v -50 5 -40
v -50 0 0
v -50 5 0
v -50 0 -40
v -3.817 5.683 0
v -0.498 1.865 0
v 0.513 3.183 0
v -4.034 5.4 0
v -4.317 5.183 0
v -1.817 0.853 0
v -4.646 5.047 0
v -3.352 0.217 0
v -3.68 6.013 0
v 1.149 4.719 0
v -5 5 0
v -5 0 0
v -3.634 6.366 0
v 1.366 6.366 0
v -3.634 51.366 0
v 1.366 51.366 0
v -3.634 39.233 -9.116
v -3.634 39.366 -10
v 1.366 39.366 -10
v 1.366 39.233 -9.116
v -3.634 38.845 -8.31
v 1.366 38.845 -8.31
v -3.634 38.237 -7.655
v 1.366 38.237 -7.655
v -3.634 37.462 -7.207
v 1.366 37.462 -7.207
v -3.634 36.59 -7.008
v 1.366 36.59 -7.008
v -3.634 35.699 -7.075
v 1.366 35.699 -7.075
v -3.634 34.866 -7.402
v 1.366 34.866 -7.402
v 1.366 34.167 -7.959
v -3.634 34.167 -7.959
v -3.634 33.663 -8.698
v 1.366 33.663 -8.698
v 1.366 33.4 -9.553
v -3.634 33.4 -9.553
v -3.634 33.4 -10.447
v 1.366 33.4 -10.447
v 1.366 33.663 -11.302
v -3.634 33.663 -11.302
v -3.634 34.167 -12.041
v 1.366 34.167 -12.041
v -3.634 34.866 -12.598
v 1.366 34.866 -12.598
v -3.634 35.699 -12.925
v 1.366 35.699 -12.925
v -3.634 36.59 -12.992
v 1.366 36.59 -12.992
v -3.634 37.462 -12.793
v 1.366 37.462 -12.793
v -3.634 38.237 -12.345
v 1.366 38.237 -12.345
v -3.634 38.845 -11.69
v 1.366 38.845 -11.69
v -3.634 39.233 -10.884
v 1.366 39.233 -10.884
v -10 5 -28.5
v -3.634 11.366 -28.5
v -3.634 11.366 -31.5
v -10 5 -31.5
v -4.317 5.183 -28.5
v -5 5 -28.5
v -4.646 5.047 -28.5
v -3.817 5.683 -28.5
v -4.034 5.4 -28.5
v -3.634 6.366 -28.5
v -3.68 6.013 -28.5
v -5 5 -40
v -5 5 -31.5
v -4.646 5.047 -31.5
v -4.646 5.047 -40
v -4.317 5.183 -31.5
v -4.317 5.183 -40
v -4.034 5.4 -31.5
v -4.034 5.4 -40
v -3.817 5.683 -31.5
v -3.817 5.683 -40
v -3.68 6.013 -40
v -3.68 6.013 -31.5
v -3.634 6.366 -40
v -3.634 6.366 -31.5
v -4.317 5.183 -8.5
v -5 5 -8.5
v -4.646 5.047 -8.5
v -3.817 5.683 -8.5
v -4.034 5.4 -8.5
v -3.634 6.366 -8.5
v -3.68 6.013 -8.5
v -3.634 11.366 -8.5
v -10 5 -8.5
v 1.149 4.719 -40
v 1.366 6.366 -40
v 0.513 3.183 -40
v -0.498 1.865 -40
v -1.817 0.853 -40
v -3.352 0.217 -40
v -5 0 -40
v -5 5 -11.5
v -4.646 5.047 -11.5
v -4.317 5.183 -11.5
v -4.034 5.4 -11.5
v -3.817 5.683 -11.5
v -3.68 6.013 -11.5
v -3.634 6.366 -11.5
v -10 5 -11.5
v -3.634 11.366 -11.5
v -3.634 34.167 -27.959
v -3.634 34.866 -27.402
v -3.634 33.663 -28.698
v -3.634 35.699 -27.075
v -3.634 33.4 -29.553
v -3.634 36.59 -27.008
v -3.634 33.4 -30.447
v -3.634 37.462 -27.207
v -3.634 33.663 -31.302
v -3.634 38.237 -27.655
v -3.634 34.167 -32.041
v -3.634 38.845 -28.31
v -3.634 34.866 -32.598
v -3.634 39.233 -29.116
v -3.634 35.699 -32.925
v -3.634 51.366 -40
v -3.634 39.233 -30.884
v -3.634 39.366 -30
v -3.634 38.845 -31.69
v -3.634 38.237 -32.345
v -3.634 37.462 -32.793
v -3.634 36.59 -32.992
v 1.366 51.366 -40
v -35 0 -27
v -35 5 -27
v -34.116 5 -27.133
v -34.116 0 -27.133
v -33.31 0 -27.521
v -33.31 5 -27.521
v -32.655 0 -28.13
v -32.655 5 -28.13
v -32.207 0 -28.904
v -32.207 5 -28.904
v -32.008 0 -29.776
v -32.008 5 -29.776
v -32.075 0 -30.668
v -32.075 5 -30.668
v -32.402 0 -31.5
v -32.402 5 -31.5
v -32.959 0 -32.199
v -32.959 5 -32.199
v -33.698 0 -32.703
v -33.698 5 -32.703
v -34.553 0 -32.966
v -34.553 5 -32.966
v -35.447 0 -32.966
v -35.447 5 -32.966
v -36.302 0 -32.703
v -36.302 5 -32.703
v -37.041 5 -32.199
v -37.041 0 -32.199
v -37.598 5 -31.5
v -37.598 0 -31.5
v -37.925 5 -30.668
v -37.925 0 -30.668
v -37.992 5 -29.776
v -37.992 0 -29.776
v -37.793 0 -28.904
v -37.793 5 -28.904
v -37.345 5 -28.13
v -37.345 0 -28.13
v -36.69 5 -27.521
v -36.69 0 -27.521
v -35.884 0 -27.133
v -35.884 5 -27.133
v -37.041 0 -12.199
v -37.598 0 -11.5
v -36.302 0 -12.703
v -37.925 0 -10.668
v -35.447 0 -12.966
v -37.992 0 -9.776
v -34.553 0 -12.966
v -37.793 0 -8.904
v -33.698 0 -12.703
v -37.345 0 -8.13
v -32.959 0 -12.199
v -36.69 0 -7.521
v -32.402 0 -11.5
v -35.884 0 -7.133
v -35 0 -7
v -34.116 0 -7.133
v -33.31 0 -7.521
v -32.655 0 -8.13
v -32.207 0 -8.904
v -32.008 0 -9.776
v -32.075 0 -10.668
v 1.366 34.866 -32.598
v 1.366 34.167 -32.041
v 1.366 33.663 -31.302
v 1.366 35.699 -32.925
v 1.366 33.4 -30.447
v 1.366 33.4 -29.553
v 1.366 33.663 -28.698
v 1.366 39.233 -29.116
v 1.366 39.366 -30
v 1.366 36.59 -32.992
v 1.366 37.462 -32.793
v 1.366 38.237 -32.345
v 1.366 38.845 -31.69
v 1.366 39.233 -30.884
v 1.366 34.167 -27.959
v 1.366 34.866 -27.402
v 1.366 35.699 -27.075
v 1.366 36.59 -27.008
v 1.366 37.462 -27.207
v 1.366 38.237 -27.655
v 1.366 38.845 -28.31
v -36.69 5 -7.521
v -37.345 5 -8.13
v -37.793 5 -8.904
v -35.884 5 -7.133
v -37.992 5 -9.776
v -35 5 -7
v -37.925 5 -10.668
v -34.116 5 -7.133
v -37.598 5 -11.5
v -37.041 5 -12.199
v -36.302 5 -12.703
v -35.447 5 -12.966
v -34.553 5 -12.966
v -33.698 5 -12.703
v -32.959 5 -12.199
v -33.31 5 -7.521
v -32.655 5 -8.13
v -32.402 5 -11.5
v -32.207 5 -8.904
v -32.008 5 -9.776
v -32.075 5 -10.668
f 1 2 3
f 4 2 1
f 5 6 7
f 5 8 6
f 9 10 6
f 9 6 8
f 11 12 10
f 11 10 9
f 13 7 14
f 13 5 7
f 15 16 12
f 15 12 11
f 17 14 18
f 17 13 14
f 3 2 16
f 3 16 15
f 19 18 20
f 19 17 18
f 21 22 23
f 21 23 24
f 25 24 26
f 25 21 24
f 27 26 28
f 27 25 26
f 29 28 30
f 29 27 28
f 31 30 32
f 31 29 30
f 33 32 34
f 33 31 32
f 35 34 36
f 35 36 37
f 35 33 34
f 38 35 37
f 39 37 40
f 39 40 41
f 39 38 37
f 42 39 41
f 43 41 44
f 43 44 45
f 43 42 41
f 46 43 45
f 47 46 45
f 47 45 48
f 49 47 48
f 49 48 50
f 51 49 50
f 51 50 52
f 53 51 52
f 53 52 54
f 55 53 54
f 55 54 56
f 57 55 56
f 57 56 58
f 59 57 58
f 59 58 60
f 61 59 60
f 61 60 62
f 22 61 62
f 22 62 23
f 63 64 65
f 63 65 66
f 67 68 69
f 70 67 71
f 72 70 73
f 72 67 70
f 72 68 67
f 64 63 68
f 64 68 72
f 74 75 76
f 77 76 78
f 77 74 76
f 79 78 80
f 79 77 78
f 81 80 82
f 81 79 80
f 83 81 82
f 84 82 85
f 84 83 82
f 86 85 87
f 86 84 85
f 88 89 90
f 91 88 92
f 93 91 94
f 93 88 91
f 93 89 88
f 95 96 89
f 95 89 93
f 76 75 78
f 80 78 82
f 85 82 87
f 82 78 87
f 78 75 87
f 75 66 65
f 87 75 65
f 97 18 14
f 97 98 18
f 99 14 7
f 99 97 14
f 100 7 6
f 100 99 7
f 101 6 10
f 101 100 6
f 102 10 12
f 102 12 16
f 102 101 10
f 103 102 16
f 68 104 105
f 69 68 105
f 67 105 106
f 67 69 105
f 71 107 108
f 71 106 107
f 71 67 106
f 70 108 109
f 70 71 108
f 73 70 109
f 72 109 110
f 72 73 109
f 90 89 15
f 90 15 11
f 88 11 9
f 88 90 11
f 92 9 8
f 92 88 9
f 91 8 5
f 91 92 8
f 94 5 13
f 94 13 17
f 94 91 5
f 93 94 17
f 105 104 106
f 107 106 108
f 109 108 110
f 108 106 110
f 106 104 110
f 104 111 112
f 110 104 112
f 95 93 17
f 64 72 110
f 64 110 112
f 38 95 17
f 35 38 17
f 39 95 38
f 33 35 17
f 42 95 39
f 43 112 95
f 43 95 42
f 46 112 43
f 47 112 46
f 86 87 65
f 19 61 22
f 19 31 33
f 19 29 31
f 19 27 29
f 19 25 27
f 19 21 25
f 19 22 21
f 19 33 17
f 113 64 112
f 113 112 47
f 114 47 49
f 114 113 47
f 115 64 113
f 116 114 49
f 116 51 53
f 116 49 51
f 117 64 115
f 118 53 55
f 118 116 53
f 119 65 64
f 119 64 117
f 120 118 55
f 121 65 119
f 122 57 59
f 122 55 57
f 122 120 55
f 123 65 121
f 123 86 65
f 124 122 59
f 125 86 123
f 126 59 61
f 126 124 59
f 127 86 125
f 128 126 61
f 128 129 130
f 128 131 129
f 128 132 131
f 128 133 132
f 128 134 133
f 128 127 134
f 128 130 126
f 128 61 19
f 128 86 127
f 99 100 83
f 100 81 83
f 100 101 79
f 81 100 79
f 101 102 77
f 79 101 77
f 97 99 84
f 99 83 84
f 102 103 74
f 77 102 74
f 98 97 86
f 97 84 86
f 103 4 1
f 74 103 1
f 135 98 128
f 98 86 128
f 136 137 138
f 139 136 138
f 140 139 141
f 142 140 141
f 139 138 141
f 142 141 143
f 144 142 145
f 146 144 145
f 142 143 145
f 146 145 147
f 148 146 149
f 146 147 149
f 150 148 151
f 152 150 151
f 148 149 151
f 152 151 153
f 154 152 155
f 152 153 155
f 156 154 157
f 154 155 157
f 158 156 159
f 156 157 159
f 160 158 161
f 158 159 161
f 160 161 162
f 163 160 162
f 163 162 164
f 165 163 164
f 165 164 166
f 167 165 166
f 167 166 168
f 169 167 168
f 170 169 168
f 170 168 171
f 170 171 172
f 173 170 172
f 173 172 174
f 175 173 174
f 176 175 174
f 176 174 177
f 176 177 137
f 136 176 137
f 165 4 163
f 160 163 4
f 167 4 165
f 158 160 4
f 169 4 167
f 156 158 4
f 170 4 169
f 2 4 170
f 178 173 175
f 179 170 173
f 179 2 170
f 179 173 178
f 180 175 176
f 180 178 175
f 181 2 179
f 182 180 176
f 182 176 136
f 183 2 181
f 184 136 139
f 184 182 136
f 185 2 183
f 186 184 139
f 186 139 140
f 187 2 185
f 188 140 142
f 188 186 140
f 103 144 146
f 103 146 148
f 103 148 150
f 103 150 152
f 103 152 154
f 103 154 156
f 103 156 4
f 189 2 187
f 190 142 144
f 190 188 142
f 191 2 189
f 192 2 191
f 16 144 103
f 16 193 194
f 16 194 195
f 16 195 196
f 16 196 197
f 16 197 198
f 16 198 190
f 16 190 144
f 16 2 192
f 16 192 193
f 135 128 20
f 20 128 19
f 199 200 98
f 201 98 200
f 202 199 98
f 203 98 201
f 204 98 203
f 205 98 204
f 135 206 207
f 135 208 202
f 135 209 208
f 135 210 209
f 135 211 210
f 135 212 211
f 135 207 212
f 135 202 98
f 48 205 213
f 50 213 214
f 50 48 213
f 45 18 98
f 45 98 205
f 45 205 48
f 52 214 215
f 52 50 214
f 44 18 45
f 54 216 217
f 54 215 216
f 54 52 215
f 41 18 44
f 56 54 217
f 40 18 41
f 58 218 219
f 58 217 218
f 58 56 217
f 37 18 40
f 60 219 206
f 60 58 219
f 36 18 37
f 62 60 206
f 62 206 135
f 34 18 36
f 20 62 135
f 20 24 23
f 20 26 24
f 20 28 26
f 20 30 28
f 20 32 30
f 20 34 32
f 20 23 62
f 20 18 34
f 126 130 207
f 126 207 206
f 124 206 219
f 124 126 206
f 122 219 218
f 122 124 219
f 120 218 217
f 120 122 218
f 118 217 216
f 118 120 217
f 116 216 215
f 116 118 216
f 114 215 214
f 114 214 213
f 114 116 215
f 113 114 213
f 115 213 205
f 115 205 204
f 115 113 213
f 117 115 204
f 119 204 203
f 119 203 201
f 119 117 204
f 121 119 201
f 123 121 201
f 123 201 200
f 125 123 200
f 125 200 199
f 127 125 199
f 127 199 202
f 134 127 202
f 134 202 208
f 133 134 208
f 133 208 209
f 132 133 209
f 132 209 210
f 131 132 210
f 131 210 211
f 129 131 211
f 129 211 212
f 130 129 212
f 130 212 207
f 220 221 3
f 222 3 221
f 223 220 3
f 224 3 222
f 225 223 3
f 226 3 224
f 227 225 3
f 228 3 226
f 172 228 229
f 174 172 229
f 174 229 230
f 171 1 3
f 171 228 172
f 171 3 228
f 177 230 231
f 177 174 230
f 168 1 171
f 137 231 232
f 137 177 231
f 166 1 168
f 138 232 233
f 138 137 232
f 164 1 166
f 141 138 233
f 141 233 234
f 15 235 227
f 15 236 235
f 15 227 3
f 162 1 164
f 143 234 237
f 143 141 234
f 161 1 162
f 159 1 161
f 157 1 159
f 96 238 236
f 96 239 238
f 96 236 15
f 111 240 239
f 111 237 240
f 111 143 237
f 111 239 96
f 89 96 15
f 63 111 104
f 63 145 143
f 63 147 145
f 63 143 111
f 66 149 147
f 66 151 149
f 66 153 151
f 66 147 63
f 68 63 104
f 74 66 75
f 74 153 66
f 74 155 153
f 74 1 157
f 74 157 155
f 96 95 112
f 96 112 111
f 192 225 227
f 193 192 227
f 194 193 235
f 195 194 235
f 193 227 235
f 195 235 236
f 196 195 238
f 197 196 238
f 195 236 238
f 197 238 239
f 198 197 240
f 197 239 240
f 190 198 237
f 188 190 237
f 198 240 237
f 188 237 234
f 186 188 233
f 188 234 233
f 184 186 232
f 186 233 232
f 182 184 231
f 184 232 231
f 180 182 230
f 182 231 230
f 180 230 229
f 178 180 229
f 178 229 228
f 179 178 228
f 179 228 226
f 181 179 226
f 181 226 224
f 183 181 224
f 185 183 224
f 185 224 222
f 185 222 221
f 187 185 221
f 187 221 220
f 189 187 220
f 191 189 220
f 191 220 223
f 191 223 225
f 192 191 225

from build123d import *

# Parameters (mm, degrees)
SKETCH1_W           = 100
SKETCH1_H           = 40
BOSS_EXTRUDE2_DEPTH = 5
SKETCH4_R           = 3
CUT_EXTRUDE6_DEPTH  = 10
FLEX3_START         = 1.366197724
FLEX3_OUTLINE_W     = 5
FLEX3_OUTLINE_H     = 40
FLEX3_DEPTH         = 48.633802276
FLEX3_START_2       = -3.633802276
FLEX3_2_OUTLINE_W   = 46.366197724
FLEX3_2_OUTLINE_H   = 40
FLEX3_2_OUTLINE_R   = 3
FLEX3_2_DEPTH       = 3.907802276
FLEX3_START_3       = -5
FLEX3_3_OUTLINE_W   = 46.366197724
FLEX3_3_OUTLINE_H   = 40
FLEX3_3_OUTLINE_R   = 3
FLEX3_3_DEPTH       = 6.366197724
FLEX3_START_4       = -40
FLEX3_4_DEPTH       = 40
BOSS_EXTRUDE3_DEPTH = 1.5
CUT_EXTRUDE7_START  = -43
CUT_EXTRUDE7_DEPTH  = 43
BOSS_EXTRUDE4_DEPTH = 1.5
CUT_EXTRUDE8_DEPTH  = 40


with BuildPart() as part:
    # Sketch1 → Boss-Extrude2 (new body)
    with BuildSketch(Plane(origin=(0, 0, 0), x_dir=(1, 0, 0), z_dir=(0, 1, 0))):
        with Locations((0, 20)):
            Rectangle(SKETCH1_W, SKETCH1_H)
    extrude(amount=BOSS_EXTRUDE2_DEPTH)

    # Sketch4 → Cut-Extrude6 (cut)
    with BuildSketch(Plane(origin=(0, 5, 0), x_dir=(1, 0, 0), z_dir=(0, 1, 0))):
        with Locations(Location((-35, 30, 0), (0, 0, 270))):
            Circle(SKETCH4_R)
        with Locations(Location((-35, 10, 0), (0, 0, 270))):
            Circle(SKETCH4_R)
        with Locations(Location((35, 10, 0), (0, 0, 270))):
            Circle(SKETCH4_R)
        with Locations(Location((35, 30, 0), (0, 0, 270))):
            Circle(SKETCH4_R)
    extrude(amount=-CUT_EXTRUDE6_DEPTH, mode=Mode.SUBTRACT)

    # Flex3: read off the stored shape, not the designer's step
    # Flex3 outline → Flex3 (cut)
    with BuildSketch(Plane.YZ.offset(FLEX3_START)):
        with Locations((2.5, -20)):
            Rectangle(FLEX3_OUTLINE_W, FLEX3_OUTLINE_H)
    extrude(amount=FLEX3_DEPTH, mode=Mode.SUBTRACT)

    # Flex3 2 outline → Flex3 2 (add)
    with BuildSketch(Plane.YZ.offset(FLEX3_START_2)):
        with Locations((28.183098862, -20)):
            Rectangle(FLEX3_2_OUTLINE_W, FLEX3_2_OUTLINE_H)
        with Locations((36.366197724, -30)):
            Circle(FLEX3_2_OUTLINE_R, mode=Mode.SUBTRACT)
        with Locations((36.366197724, -10)):
            Circle(FLEX3_2_OUTLINE_R, mode=Mode.SUBTRACT)
    extrude(amount=FLEX3_2_DEPTH)

    # Flex3 3 outline → Flex3 3 (add)
    with BuildSketch(Plane.YZ.offset(FLEX3_START_3)):
        with Locations((28.183098862, -20)):
            Rectangle(FLEX3_3_OUTLINE_W, FLEX3_3_OUTLINE_H)
        with Locations((36.366197724, -30)):
            Circle(FLEX3_3_OUTLINE_R, mode=Mode.SUBTRACT)
        with Locations((36.366197724, -10)):
            Circle(FLEX3_3_OUTLINE_R, mode=Mode.SUBTRACT)
    extrude(amount=FLEX3_3_DEPTH)

    # Flex3 4 outline → Flex3 4 (cut)
    with BuildSketch(Plane.XY.offset(FLEX3_START_4)):
        with BuildLine():
            Line((1.366197724, 0), (1.366197724, 6.366197724))
            ThreePointArc((1.366197724, 6.366197724), (-0.498418419, 1.864616143), (-5, 0))
            Line((-5, 0), (1.366197724, 0))
        make_face()
        with BuildLine():
            ThreePointArc((-5, 5), (-4.033952325, 5.400150049), (-3.633802276, 6.366197724))
            Line((-3.633802276, 6.366197724), (-3.633802276, 51.366197724))
            Line((-3.633802276, 51.366197724), (-5, 51.366197724))
            Line((-5, 51.366197724), (-5, 5))
        make_face()
    extrude(amount=FLEX3_4_DEPTH, mode=Mode.SUBTRACT)

    # Sketch6 → Boss-Extrude3 (add, symmetric)
    with BuildSketch(Plane.XY.offset(-10)):
        Polygon((0, 0), (0, 15), (-15, 0), align=None)
    extrude(amount=BOSS_EXTRUDE3_DEPTH, both=True)

    # Sketch7 → Cut-Extrude7 (cut)
    with BuildSketch(Plane.XY.offset(CUT_EXTRUDE7_START)):
        with BuildLine():
            Line((-5, 0), (0, 0))
            Line((0, 0), (0, 2.425579313))
            ThreePointArc((0, 2.425579313), (-2.221356671, 0.638404544), (-5, 0))
        make_face()
    extrude(amount=CUT_EXTRUDE7_DEPTH, mode=Mode.SUBTRACT)

    # Sketch9 → Boss-Extrude4 (add, symmetric)
    with BuildSketch(Plane.XY.offset(-30)):
        Polygon((0, 0), (0, 15), (-15, 0), align=None)
    extrude(amount=BOSS_EXTRUDE4_DEPTH, both=True)

    # Sketch10 → Cut-Extrude8 (cut)
    with BuildSketch(Plane(origin=(0, 0, -40), x_dir=(-1, 0, 0), z_dir=(0, 0, -1))):
        with BuildLine():
            Line((0, 2.425579313), (0, 0))
            Line((0, 0), (5, 0))
            ThreePointArc((5, 0), (2.221356671, 0.638404544), (0, 2.425579313))
        make_face()
    extrude(amount=-CUT_EXTRUDE8_DEPTH, mode=Mode.SUBTRACT)


solid = part.part
